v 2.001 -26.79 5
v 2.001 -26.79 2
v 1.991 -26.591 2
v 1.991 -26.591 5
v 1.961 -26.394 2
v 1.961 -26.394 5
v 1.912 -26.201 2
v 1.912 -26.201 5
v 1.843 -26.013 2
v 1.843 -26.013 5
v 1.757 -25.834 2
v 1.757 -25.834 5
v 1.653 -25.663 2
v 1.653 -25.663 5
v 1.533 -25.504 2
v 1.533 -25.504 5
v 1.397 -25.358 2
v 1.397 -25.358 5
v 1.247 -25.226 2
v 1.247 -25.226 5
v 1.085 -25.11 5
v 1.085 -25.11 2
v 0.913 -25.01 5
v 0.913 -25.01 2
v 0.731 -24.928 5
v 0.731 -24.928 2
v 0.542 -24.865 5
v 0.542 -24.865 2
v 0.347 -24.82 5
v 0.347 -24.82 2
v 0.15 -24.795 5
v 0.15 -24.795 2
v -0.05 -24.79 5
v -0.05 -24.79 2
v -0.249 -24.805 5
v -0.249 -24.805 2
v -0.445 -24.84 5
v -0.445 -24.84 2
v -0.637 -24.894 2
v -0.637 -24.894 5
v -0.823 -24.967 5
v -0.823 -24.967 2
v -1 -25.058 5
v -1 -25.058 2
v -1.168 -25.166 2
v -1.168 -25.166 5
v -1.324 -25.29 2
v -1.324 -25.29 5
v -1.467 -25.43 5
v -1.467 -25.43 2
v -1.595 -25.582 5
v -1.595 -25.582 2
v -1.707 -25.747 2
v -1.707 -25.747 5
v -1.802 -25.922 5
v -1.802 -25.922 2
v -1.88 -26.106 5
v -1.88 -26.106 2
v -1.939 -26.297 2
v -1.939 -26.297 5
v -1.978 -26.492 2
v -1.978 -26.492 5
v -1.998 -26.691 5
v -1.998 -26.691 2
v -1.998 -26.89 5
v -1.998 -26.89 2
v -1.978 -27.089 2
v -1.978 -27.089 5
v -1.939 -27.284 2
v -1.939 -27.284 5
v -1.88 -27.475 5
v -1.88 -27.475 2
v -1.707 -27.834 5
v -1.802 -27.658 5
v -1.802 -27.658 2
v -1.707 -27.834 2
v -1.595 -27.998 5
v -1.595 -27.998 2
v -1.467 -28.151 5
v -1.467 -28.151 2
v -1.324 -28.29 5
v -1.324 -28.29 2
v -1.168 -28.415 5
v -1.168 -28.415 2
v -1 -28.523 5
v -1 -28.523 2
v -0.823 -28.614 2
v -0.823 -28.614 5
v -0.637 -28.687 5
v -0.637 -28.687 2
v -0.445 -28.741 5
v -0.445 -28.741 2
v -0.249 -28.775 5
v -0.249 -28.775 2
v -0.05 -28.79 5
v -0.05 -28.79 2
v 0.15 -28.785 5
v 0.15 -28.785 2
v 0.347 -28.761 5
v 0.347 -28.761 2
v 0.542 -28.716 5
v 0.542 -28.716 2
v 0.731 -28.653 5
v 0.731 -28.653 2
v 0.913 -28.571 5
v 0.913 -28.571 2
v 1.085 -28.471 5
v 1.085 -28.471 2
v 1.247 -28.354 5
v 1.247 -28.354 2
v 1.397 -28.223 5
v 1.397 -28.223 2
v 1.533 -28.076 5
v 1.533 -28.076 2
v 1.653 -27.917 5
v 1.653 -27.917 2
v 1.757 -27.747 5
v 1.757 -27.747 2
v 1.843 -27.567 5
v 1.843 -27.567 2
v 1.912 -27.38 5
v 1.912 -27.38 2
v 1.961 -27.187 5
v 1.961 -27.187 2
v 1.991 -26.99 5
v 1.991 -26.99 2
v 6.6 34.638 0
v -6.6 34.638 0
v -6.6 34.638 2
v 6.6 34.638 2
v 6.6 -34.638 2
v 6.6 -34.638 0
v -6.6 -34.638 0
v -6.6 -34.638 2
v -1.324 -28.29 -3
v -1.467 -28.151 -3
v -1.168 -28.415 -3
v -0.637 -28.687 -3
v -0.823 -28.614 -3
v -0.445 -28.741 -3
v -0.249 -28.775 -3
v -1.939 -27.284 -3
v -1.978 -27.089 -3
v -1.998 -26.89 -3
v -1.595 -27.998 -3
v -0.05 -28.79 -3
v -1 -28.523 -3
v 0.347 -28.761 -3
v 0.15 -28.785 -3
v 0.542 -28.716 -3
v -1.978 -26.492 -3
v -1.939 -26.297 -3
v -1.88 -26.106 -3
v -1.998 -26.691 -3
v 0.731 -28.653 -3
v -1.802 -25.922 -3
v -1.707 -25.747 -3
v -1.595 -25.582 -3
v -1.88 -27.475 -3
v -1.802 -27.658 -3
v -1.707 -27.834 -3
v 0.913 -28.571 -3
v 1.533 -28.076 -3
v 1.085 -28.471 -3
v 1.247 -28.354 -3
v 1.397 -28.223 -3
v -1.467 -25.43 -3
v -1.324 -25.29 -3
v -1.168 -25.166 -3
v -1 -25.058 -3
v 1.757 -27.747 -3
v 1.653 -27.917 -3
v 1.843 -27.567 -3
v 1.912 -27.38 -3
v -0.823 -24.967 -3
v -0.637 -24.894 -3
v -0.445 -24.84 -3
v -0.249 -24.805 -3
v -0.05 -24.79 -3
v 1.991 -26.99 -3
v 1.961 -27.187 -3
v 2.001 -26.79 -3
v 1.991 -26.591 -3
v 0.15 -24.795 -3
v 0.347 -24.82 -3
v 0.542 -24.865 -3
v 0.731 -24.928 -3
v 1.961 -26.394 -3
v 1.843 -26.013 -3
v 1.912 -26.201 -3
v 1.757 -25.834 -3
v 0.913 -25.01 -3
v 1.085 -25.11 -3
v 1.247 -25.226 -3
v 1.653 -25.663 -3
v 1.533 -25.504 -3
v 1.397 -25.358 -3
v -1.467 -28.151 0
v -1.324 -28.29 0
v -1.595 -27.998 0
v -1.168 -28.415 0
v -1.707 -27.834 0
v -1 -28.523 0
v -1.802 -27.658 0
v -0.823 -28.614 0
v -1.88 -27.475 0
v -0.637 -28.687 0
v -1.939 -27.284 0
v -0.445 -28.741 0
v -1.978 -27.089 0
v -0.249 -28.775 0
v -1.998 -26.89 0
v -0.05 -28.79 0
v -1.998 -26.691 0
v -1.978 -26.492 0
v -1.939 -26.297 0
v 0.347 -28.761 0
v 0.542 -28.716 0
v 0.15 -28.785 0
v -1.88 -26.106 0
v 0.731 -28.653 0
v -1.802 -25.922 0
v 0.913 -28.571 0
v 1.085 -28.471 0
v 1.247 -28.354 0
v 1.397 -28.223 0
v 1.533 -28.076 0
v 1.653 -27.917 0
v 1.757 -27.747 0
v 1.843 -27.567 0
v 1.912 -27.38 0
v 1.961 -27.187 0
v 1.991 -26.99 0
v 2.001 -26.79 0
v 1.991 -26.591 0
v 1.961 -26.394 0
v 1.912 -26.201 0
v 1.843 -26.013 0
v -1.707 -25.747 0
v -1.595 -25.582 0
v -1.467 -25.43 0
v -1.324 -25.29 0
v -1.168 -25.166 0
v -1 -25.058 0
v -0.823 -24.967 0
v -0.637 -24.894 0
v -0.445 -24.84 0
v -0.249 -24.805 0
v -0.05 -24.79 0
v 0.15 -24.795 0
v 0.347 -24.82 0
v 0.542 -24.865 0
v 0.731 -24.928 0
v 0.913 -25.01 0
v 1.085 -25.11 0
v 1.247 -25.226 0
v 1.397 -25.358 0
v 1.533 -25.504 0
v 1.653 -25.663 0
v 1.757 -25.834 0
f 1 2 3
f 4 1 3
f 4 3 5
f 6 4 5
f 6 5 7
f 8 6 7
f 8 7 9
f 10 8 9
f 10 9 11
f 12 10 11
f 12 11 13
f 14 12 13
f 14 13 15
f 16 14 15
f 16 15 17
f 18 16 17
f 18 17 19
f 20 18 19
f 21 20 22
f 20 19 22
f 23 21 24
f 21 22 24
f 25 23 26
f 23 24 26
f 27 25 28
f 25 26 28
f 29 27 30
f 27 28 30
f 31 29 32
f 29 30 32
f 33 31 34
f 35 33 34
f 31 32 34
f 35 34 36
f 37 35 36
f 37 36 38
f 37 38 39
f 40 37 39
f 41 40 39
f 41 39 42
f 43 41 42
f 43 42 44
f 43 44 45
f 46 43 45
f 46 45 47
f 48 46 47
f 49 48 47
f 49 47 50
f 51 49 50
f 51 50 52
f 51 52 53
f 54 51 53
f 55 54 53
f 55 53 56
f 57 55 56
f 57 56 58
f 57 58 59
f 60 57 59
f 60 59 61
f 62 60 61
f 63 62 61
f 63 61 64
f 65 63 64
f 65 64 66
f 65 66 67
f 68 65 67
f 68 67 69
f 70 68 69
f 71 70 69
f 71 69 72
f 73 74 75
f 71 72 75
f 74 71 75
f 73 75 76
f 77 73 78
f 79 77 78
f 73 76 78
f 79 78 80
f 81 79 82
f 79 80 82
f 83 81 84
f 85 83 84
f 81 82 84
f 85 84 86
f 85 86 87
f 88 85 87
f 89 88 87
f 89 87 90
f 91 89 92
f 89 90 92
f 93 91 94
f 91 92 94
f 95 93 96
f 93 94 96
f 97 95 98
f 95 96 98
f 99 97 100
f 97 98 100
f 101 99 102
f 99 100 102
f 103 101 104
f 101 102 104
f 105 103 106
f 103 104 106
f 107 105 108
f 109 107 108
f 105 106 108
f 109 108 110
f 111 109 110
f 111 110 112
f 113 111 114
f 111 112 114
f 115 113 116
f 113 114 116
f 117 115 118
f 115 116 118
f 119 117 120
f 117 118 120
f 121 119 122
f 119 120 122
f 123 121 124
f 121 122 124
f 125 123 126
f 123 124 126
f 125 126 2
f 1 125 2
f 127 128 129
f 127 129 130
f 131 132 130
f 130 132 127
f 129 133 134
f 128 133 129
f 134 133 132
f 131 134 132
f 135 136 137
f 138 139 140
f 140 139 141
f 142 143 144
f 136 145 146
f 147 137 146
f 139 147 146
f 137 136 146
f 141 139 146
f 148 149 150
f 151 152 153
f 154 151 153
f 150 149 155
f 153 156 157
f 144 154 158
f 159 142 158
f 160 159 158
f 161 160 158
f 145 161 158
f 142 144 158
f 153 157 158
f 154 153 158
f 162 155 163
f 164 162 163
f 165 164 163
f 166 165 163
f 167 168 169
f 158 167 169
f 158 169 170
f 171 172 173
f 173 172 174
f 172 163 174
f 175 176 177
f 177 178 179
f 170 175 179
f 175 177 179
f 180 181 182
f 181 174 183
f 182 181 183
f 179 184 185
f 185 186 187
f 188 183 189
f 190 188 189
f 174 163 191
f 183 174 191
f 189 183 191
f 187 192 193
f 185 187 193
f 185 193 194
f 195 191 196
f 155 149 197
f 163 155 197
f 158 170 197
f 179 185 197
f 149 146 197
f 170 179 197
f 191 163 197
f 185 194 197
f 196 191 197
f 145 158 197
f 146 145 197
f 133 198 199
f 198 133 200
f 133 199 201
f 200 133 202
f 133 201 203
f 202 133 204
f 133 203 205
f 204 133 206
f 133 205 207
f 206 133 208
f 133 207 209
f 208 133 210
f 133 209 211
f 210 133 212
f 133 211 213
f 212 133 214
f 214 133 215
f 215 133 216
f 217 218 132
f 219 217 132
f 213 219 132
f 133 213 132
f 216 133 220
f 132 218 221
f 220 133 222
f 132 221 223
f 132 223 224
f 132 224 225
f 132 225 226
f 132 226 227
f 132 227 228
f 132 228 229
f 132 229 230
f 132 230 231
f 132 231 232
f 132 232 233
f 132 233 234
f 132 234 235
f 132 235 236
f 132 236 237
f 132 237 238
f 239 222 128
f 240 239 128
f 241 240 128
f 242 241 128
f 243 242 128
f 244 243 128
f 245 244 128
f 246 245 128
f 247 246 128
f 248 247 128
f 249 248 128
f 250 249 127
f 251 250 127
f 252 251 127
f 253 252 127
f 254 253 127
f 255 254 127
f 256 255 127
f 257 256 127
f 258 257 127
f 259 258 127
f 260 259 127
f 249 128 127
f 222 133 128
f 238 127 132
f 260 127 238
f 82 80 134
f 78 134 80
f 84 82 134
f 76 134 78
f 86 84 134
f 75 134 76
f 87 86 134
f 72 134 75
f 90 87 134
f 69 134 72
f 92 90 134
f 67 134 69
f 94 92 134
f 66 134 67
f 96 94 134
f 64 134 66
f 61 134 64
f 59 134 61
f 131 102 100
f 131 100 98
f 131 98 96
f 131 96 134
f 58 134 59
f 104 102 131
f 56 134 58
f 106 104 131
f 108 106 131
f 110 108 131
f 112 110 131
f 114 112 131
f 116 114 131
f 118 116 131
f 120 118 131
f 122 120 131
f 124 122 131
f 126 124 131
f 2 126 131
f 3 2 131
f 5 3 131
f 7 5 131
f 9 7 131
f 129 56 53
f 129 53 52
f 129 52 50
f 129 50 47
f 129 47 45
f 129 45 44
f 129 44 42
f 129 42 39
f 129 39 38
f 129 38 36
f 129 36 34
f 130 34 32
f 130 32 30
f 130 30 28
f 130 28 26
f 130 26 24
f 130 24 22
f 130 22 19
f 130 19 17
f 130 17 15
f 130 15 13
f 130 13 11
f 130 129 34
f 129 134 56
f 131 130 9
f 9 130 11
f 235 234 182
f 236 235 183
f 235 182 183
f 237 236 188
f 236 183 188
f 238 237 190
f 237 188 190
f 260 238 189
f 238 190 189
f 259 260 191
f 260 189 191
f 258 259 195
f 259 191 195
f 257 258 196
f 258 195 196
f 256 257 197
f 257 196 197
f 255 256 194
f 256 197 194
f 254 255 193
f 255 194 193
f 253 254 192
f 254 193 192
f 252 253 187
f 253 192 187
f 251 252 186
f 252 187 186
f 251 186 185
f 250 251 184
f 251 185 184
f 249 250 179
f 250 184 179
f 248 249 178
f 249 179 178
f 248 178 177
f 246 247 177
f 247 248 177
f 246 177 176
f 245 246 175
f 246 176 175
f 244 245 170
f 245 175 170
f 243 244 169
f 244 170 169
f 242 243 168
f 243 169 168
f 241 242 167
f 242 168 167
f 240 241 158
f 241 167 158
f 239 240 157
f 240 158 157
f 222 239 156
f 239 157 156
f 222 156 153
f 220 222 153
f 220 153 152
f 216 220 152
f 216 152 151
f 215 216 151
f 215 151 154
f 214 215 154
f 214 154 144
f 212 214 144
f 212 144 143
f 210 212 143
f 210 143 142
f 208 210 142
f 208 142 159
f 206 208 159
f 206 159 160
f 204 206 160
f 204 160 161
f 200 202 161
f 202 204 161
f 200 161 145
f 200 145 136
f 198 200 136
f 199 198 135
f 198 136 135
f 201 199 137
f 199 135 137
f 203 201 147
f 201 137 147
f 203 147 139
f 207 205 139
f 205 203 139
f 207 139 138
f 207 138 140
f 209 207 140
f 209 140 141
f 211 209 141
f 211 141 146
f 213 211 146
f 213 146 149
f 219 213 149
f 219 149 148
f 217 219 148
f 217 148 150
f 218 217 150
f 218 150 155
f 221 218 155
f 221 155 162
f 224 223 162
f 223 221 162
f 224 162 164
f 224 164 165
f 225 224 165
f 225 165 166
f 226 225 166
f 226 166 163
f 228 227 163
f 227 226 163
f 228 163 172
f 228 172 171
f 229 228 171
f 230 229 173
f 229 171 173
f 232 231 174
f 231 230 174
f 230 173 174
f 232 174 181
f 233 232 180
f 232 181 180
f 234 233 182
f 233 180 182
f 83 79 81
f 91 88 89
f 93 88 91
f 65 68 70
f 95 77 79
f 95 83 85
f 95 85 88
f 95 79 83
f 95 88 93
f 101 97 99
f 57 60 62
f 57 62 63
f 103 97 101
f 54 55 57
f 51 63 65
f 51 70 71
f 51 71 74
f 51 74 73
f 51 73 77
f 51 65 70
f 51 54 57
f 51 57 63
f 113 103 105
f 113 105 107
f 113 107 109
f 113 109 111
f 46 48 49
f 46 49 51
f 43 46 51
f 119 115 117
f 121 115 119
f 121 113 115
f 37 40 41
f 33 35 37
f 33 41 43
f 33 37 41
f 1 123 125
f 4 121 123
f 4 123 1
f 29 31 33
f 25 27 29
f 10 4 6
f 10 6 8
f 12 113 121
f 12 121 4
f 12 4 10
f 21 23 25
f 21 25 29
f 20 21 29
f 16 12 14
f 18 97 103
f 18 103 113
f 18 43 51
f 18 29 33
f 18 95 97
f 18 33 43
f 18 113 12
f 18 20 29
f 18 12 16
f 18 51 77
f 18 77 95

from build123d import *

# Parameters (mm, degrees)
SKETCH_1_W           = 13.199674752
SKETCH_1_H           = 69.2763861
EXTRUDE_1_DEPTH      = 2
EXTRUDE_2_DEPTH      = 3
EXTRUDE_2_DEPTH_BACK = 5
SKETCH_2_R           = 2.000590496


with BuildPart() as part:
    # 草图1 → 凸台-拉伸1 (new body)
    with BuildSketch(Plane.XY):
        Rectangle(SKETCH_1_W, SKETCH_1_H)
    extrude(amount=EXTRUDE_1_DEPTH)

    # 草图2 → 凸台-拉伸2 (add, two sides: drawn at the far end of the back side and taken through both)
    with BuildSketch(Plane.XY.offset(2).offset(-EXTRUDE_2_DEPTH_BACK)):
        with Locations((0, -26.790353818)):
            Circle(SKETCH_2_R)
    extrude(amount=EXTRUDE_2_DEPTH + EXTRUDE_2_DEPTH_BACK)


solid = part.part
